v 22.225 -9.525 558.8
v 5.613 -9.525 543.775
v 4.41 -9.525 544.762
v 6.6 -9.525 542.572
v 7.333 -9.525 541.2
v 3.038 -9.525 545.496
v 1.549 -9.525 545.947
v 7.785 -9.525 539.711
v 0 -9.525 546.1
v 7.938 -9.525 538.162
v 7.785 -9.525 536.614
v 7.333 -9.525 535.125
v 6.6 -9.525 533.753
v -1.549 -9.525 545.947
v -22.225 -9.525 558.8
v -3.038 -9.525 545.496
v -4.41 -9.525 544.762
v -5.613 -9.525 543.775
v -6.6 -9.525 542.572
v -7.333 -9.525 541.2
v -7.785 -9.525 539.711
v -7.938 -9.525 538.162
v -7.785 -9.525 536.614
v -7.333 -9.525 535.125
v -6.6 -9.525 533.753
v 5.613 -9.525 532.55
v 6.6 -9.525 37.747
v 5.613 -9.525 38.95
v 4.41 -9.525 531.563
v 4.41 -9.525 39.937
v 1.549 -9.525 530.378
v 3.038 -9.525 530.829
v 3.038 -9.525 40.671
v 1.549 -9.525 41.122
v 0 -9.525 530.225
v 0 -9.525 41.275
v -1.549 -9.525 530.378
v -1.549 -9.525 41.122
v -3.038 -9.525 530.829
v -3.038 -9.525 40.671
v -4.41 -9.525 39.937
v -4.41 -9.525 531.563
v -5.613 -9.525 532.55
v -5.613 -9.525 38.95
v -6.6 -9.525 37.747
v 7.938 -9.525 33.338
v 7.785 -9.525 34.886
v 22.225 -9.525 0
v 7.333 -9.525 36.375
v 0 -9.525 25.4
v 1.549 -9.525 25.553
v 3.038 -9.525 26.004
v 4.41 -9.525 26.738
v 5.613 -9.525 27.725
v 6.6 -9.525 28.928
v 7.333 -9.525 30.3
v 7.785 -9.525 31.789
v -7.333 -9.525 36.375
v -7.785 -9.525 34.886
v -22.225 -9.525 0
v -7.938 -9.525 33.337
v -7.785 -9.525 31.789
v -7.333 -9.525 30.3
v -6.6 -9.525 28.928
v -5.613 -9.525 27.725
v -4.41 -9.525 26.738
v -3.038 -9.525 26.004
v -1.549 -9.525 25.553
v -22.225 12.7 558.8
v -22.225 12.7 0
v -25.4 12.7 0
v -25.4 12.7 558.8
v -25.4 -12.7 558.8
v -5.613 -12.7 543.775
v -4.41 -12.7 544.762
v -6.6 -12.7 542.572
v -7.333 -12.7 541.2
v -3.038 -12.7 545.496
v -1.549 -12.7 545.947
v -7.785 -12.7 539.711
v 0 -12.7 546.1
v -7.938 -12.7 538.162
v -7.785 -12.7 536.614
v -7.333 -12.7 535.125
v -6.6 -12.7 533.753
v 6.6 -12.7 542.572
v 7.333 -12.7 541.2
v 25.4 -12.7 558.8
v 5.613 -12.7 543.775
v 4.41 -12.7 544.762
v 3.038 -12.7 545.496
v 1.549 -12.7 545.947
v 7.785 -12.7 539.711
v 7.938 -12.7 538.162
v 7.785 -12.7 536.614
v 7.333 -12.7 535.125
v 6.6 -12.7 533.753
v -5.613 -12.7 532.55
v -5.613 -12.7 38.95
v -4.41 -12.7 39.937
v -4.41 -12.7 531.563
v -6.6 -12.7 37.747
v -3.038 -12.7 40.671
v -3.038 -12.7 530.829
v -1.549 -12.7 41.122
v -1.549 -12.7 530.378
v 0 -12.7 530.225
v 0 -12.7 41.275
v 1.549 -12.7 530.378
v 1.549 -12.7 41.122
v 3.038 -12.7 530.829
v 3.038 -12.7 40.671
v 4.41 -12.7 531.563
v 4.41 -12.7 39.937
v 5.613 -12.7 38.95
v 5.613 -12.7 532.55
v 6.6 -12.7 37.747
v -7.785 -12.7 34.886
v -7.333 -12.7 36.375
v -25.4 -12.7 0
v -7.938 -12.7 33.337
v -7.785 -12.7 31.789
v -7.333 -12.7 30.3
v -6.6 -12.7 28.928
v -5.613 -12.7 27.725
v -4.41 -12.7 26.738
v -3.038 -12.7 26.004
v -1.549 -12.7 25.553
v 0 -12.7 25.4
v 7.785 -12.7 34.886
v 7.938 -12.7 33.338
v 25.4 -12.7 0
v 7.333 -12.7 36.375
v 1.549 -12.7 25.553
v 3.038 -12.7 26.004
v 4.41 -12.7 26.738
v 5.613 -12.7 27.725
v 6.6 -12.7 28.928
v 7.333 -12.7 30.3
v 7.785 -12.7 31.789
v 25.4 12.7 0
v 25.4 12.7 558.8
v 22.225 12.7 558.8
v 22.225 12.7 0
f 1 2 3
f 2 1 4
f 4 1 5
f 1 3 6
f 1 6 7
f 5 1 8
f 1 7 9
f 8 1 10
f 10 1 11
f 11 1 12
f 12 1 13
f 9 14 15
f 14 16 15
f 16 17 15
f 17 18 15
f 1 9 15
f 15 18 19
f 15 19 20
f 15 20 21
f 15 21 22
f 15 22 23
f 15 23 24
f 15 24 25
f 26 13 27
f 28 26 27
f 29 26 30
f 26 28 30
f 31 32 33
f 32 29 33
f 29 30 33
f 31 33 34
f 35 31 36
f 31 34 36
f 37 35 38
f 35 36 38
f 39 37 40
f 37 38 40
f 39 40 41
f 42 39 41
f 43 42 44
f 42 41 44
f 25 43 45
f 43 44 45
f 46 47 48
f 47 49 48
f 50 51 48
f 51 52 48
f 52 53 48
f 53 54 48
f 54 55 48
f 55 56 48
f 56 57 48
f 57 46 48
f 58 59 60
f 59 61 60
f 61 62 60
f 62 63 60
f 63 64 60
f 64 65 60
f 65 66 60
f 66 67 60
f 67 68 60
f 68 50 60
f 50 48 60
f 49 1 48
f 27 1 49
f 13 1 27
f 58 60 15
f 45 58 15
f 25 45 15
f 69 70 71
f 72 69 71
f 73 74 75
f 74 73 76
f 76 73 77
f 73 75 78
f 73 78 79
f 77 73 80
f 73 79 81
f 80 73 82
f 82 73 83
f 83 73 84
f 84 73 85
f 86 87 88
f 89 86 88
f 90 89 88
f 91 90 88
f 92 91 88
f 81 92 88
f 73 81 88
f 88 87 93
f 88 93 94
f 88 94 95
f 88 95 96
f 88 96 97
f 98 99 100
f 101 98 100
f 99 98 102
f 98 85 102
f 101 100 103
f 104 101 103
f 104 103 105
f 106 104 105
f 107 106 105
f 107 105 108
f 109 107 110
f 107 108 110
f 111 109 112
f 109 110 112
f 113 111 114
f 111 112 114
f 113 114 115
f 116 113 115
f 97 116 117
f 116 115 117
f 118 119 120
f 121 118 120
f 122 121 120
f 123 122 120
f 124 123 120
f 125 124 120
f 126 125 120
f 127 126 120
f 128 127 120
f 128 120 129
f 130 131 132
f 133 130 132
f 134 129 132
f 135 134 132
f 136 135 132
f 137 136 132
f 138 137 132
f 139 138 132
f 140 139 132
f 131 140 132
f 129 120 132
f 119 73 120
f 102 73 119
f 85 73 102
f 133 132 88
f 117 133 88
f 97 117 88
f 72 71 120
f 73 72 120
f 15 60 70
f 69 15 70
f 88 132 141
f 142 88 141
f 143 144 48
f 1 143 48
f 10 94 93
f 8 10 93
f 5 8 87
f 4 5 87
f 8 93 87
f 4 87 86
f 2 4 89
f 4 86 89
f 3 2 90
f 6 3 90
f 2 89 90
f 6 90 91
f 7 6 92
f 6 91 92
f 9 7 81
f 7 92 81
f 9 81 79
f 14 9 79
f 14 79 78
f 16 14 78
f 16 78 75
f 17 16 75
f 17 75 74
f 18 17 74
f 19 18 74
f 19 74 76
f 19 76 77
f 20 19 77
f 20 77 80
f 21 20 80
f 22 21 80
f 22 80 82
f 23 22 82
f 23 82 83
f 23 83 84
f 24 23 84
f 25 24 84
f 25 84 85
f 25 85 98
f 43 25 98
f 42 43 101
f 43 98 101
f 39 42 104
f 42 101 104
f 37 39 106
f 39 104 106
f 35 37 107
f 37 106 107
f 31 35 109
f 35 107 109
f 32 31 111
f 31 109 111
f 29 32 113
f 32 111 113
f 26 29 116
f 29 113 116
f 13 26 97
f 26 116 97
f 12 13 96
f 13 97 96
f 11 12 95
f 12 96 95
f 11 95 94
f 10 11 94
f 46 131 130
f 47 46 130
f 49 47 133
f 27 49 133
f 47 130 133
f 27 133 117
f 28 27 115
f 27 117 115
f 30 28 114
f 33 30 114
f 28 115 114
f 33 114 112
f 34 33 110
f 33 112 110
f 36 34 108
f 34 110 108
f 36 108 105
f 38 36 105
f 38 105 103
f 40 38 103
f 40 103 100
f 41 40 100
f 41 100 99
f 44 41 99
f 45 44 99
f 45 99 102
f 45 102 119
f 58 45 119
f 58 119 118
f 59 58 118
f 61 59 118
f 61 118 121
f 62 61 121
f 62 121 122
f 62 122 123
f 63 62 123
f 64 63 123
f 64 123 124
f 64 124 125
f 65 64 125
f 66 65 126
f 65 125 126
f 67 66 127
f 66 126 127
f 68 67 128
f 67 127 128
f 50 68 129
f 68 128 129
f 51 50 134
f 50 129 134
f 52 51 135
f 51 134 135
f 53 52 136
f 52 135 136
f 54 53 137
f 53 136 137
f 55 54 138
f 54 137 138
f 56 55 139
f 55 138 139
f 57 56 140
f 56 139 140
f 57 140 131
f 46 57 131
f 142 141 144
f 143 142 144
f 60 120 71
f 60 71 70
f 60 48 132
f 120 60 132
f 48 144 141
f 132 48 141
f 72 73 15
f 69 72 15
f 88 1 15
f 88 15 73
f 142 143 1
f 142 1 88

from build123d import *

# Parameters (mm, degrees)
BOSS_EXTRUDE1_DEPTH = 558.8
CUT_EXTRUDE1_REACH  = 561.953
SKETCH2_R           = 7.9375
CUT_EXTRUDE2_REACH  = 561.953
SKETCH3_R           = 7.9375


with BuildPart() as part:
    # Sketch1 → Boss-Extrude1 (new body)
    with BuildSketch(Plane.XY):
        Polygon((-22.225, -9.525), (-22.225, 12.7), (-25.4, 12.7), (-25.4, -12.7), (25.4, -12.7), (25.4, 12.7), (22.225, 12.7), (22.225, -9.525), align=None)
    extrude(amount=BOSS_EXTRUDE1_DEPTH)

    # Sketch2 → Cut-Extrude1 (cut, up to next)
    with BuildSketch(Plane.XZ.offset(12.7), mode=Mode.PRIVATE) as cut_extrude1_sk1:
        with Locations((0, 33.3375)):
            Circle(SKETCH2_R)
    cut_extrude1_tool1 = extrude(cut_extrude1_sk1.sketch, amount=-CUT_EXTRUDE1_REACH, mode=Mode.PRIVATE) & part.part
    add(cut_extrude1_tool1.solids().sort_by_distance((0, -12.7, 33.3375))[0], mode=Mode.SUBTRACT)

    # Sketch3 → Cut-Extrude2 (cut, up to next)
    with BuildSketch(Plane.XZ.offset(12.7), mode=Mode.PRIVATE) as cut_extrude2_sk1:
        with Locations((0, 538.1625)):
            Circle(SKETCH3_R)
    cut_extrude2_tool1 = extrude(cut_extrude2_sk1.sketch, amount=-CUT_EXTRUDE2_REACH, mode=Mode.PRIVATE) & part.part
    add(cut_extrude2_tool1.solids().sort_by_distance((0, -12.7, 538.1625))[0], mode=Mode.SUBTRACT)


solid = part.part
